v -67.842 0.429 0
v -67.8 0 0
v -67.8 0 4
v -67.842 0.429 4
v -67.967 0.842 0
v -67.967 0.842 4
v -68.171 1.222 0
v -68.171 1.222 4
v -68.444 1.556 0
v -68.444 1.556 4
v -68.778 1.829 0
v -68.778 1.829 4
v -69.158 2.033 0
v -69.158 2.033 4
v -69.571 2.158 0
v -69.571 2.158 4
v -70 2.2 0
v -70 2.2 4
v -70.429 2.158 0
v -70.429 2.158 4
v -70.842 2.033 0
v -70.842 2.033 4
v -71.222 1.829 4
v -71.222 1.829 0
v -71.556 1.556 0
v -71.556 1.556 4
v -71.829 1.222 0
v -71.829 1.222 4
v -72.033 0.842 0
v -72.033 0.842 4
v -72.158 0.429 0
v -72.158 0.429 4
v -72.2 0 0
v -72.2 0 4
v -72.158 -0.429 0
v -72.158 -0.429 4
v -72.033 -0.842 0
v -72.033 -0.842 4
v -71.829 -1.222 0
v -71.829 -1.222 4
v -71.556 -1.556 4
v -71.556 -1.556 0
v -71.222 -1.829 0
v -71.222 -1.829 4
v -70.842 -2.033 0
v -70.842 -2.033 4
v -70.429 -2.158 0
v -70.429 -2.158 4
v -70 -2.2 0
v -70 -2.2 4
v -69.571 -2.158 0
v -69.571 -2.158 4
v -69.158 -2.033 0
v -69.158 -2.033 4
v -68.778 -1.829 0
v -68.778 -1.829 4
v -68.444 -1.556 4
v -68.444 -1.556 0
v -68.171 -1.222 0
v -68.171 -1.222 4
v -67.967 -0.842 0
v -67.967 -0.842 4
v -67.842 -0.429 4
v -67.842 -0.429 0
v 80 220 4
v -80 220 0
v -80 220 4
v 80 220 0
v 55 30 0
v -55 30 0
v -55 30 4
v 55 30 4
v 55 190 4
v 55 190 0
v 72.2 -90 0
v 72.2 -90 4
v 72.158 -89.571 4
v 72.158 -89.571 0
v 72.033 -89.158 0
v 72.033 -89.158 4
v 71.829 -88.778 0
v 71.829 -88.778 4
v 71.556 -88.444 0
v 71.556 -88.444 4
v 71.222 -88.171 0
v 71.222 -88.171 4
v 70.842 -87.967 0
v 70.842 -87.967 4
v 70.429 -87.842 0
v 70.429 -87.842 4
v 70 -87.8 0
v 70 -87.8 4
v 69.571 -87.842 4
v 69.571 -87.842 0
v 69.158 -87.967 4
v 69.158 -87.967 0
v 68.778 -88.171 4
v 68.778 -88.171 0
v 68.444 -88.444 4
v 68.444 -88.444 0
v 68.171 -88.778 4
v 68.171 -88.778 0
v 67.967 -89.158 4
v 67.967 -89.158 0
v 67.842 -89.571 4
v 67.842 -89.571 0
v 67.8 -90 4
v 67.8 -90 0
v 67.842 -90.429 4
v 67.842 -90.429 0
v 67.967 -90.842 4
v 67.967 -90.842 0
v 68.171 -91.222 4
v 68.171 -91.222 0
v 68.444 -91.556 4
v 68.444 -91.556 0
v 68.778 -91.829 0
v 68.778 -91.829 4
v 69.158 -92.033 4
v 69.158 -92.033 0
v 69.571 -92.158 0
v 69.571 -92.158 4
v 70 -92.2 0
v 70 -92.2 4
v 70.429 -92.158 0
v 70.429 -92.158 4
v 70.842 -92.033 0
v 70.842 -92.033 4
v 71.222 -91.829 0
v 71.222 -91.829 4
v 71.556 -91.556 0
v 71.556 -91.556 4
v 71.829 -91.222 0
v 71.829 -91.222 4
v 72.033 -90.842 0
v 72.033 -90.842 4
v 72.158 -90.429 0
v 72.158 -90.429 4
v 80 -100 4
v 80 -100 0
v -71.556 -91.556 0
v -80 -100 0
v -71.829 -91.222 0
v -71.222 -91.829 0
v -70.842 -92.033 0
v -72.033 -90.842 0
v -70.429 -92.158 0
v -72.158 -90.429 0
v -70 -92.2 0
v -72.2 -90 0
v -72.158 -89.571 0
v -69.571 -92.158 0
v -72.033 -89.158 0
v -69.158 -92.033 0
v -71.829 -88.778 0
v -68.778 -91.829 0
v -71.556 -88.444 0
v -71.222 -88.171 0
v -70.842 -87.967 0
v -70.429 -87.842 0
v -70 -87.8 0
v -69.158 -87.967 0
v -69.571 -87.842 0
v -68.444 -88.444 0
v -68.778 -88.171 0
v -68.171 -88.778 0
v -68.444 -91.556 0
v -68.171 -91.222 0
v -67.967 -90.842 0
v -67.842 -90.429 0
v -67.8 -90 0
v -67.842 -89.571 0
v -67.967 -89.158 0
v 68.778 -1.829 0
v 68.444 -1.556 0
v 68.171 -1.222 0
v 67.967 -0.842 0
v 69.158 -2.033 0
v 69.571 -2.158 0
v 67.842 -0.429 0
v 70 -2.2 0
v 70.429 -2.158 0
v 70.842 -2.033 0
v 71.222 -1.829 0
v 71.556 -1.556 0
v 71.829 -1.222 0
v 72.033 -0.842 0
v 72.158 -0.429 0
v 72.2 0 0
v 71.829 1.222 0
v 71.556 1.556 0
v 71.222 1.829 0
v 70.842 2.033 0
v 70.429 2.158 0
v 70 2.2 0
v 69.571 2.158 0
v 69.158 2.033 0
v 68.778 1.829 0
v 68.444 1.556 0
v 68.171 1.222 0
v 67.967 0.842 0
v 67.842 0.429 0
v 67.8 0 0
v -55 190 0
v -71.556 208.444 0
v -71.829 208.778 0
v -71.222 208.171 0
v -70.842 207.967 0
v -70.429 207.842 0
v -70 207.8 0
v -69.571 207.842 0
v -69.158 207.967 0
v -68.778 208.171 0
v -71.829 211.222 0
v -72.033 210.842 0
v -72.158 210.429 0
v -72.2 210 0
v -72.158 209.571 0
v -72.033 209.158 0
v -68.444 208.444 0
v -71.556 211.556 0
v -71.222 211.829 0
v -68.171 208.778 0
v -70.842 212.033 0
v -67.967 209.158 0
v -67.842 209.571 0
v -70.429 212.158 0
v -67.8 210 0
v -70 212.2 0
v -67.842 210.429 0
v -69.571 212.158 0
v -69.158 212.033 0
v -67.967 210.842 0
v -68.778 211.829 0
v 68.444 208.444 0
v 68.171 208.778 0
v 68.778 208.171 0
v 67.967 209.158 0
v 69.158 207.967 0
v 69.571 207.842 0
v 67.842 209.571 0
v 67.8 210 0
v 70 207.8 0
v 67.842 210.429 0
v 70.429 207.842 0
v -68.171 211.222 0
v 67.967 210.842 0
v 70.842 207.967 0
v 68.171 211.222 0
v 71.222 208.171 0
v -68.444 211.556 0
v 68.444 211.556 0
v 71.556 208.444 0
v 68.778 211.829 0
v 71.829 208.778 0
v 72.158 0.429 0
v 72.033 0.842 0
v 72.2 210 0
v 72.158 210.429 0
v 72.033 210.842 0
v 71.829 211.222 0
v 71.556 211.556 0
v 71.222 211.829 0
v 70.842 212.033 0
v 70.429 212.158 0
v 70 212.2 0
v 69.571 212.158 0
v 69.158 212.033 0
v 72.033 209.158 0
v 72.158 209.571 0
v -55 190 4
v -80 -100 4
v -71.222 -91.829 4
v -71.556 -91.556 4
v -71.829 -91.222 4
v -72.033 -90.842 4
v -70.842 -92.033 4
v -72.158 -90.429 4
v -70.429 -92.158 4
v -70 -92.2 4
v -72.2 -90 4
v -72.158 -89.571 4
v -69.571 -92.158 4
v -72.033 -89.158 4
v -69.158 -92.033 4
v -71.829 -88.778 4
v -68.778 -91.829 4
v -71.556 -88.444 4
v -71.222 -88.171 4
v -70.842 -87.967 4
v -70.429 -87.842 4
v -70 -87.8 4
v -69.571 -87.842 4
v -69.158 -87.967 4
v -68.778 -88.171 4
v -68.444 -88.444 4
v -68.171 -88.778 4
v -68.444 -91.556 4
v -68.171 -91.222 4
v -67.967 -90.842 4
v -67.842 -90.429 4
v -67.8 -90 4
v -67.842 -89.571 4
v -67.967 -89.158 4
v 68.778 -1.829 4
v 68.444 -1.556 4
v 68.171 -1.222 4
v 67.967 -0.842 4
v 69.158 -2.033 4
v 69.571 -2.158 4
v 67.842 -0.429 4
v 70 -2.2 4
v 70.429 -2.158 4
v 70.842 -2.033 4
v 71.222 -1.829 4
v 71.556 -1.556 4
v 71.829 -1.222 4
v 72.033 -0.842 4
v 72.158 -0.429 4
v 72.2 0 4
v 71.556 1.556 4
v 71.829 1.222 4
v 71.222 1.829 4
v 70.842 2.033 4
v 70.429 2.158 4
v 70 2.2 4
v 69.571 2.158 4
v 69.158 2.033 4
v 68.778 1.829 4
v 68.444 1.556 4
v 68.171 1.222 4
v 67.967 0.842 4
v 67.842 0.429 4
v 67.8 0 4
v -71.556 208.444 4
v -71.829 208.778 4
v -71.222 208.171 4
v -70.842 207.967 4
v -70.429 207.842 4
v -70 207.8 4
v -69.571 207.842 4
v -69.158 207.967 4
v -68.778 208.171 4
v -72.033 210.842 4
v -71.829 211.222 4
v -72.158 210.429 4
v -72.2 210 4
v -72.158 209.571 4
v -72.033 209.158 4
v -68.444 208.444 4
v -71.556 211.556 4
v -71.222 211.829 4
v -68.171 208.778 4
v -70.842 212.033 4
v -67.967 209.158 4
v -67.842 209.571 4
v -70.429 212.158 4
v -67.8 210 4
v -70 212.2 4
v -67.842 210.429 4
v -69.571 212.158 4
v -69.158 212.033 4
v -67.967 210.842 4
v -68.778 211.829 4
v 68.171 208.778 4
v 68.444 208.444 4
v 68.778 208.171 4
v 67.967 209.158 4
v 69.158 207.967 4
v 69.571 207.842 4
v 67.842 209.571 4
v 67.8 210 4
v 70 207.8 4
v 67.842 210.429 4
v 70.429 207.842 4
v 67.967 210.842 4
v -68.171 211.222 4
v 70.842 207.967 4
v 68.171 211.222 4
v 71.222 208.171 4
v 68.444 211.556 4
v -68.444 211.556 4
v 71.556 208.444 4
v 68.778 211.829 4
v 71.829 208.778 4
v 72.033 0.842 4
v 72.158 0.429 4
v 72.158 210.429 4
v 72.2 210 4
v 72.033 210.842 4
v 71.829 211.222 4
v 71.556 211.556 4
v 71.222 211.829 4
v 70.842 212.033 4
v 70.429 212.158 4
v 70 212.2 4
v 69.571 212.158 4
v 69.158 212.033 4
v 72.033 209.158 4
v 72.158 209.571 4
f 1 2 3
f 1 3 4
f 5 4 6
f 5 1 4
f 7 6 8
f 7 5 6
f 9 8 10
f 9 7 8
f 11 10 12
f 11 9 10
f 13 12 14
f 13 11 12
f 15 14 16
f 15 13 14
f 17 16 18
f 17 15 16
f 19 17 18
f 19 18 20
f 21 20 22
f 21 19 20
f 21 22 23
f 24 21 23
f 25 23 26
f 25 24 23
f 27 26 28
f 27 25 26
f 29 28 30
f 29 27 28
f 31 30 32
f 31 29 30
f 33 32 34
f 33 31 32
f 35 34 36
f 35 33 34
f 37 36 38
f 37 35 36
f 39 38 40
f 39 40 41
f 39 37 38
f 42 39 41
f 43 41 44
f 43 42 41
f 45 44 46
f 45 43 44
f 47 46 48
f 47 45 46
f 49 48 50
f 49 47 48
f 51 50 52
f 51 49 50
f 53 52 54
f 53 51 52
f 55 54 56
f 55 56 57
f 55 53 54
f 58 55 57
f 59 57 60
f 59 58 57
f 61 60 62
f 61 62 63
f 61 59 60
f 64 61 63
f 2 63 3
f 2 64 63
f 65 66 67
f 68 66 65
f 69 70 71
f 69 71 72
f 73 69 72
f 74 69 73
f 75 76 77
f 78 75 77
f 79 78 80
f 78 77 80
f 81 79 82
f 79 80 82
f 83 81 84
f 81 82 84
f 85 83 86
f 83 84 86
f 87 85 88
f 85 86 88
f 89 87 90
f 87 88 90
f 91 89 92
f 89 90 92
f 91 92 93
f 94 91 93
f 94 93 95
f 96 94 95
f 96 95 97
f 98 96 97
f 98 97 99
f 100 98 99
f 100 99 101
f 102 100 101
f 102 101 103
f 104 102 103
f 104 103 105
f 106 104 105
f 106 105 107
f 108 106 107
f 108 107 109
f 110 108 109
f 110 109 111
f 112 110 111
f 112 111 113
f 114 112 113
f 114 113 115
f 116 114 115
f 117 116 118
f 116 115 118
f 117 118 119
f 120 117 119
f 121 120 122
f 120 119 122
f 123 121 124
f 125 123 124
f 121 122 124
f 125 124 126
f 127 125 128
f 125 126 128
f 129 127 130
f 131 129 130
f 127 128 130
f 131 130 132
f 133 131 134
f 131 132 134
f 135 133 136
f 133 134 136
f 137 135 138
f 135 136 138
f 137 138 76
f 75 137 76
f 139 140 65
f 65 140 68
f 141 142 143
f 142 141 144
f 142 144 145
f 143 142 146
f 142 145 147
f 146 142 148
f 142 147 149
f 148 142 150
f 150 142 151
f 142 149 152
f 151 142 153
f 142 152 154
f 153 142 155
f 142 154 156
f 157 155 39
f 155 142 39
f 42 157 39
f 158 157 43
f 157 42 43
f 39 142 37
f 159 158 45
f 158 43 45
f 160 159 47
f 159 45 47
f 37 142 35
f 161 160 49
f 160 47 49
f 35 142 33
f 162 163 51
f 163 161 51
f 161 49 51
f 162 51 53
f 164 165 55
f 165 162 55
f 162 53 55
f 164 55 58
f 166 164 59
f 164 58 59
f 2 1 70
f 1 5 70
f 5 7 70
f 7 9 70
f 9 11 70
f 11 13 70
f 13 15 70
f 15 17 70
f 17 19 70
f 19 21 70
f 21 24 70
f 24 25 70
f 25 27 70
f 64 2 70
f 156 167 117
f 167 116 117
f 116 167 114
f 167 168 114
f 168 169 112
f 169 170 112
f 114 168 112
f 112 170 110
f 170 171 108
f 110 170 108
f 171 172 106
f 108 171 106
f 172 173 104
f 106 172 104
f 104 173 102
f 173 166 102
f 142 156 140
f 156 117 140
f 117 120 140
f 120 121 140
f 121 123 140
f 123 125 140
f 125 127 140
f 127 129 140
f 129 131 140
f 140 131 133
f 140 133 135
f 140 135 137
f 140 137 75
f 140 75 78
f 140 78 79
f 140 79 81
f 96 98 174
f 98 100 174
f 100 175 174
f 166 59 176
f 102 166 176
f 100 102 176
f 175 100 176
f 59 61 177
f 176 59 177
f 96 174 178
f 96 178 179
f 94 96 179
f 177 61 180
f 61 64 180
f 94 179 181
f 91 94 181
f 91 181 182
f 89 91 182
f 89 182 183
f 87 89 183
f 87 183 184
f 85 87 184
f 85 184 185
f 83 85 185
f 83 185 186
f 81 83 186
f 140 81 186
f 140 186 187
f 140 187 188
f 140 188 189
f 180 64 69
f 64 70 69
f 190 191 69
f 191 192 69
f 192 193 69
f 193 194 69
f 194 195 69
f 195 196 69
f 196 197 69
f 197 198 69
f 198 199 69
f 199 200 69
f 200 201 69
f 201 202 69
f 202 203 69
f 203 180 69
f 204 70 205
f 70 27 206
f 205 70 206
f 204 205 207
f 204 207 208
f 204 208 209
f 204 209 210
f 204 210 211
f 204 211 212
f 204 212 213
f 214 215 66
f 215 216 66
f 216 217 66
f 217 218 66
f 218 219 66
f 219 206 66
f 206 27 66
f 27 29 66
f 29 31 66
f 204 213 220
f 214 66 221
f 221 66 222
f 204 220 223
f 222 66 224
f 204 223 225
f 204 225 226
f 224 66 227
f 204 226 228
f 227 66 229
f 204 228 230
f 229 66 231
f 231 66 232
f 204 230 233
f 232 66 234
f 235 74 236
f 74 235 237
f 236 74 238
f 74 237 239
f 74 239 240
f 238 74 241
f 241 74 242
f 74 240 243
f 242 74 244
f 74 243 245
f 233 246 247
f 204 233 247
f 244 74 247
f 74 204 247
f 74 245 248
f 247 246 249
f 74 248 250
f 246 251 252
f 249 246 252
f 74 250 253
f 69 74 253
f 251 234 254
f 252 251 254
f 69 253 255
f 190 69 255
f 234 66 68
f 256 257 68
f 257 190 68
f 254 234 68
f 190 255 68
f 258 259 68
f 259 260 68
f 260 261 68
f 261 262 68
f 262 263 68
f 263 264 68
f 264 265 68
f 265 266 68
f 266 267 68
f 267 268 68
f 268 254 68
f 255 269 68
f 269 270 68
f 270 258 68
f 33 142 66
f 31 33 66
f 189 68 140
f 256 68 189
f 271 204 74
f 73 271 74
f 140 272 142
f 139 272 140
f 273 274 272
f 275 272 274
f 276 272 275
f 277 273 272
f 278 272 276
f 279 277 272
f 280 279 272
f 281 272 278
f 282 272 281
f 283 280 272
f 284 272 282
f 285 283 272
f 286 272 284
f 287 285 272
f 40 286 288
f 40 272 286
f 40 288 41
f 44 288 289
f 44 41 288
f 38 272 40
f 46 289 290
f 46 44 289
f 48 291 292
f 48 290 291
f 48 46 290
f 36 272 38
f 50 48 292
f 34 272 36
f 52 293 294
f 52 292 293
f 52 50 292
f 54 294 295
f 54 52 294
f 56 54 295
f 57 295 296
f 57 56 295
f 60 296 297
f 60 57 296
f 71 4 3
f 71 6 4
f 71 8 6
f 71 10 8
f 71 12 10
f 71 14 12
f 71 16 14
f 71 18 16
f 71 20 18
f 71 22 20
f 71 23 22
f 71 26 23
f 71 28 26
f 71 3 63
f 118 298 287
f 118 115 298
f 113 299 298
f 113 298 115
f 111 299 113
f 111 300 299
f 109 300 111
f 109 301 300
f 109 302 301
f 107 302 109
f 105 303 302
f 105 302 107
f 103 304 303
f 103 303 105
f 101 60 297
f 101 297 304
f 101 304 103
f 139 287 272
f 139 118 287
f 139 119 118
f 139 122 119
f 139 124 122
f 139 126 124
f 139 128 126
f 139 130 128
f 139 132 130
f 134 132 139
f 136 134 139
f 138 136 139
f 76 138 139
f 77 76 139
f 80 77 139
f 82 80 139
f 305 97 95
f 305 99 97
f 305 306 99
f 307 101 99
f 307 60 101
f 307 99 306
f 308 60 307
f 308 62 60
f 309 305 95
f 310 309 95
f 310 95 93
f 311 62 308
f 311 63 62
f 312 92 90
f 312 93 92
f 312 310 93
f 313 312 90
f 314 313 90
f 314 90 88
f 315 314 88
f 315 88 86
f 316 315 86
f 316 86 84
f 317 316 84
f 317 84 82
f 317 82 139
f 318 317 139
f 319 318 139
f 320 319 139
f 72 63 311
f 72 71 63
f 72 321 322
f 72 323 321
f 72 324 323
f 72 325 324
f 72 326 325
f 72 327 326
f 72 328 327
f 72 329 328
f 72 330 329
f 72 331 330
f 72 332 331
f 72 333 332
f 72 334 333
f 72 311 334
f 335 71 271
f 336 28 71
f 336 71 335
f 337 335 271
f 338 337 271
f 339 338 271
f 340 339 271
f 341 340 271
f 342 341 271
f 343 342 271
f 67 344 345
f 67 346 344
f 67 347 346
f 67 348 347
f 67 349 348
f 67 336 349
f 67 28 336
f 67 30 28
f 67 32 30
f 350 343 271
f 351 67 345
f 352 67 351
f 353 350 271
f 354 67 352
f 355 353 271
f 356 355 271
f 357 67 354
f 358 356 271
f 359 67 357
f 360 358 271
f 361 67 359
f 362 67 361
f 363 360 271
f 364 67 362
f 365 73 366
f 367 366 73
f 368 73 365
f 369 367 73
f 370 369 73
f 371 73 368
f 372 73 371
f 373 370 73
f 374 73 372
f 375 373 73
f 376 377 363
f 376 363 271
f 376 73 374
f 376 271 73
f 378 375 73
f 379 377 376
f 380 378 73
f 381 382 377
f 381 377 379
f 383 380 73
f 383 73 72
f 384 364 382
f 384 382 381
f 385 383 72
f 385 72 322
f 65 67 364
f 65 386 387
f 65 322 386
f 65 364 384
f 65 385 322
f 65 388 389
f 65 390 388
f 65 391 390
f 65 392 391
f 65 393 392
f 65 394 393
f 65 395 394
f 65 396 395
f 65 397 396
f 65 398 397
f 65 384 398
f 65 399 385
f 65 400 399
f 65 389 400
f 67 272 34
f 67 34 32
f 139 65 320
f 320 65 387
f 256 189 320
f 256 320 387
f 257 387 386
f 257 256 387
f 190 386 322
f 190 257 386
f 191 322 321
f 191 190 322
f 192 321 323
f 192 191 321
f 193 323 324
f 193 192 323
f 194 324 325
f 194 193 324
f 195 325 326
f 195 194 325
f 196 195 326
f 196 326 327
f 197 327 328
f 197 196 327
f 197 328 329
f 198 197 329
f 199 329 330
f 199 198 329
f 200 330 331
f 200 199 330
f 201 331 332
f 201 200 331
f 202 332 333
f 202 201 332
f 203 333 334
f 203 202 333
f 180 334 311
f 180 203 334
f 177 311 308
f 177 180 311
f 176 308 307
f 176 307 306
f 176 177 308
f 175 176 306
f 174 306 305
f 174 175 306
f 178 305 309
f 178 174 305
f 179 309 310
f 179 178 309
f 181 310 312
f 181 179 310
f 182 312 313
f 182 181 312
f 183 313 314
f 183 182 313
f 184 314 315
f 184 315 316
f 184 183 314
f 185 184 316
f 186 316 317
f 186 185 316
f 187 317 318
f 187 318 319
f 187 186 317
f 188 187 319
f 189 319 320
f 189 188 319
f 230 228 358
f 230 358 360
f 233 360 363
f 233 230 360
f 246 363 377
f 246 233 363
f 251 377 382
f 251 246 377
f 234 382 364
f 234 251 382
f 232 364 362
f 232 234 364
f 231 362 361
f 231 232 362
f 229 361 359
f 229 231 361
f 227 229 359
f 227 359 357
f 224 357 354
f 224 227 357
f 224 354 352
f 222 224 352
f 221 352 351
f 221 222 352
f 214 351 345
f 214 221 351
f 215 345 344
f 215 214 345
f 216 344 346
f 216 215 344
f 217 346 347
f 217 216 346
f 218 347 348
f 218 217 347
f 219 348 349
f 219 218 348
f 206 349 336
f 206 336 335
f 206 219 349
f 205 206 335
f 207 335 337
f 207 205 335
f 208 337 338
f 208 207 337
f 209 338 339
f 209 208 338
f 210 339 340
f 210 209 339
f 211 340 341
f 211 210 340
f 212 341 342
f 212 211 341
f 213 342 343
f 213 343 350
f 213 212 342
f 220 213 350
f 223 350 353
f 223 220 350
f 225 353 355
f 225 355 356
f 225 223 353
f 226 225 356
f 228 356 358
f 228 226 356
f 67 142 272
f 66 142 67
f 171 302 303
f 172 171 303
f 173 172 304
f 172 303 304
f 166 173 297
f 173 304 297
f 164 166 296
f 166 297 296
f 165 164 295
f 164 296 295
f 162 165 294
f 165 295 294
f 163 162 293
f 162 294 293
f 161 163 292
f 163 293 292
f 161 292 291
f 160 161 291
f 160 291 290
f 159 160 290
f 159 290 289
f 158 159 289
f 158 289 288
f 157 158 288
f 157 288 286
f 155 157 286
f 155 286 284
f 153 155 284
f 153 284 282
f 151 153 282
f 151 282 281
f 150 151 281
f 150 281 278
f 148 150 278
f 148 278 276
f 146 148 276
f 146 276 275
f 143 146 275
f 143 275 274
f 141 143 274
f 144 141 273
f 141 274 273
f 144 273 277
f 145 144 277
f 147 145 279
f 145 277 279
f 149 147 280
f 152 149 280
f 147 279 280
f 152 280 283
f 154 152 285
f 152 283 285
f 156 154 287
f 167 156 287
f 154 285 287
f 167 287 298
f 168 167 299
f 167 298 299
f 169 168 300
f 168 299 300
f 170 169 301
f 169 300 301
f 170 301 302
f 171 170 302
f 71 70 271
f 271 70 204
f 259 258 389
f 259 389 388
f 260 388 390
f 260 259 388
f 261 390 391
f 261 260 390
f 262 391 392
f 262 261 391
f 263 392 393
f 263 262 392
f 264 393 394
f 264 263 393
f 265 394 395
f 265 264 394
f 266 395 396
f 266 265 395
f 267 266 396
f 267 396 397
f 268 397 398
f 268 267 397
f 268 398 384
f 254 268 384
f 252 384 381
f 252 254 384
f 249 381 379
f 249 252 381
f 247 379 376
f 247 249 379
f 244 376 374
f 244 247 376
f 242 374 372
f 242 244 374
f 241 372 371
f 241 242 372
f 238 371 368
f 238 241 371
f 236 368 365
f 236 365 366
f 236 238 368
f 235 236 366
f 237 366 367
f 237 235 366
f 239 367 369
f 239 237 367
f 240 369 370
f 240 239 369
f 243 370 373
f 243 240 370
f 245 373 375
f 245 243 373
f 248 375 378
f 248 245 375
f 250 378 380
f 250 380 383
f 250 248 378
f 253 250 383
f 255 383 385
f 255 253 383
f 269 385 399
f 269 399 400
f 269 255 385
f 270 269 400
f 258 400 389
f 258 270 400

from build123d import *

# Parameters (mm, degrees)
ESQUISSE1_W             = 160
ESQUISSE1_H             = 440
ESQUISSE1_R             = 2.2
ESQUISSE1_W_2           = 110
ESQUISSE1_H_2           = 160
BOSS_EXTRU_1_DEPTH      = 4
ESQUISSE2_R             = 2.2
ESQUISSE2_W             = 160
ESQUISSE2_H             = 120
ENL_V_MAT_EXTRU_1_DEPTH = 5


with BuildPart() as part:
    # Esquisse1 → Boss.-Extru.1 (new body)
    with BuildSketch(Plane.XY):
        Rectangle(ESQUISSE1_W, ESQUISSE1_H)
        with Locations((70, 0)):
            Circle(ESQUISSE1_R, mode=Mode.SUBTRACT)
        with Locations((70, 210)):
            Circle(ESQUISSE1_R, mode=Mode.SUBTRACT)
        with Locations((70, -210)):
            Circle(ESQUISSE1_R, mode=Mode.SUBTRACT)
        with Locations((-70, 210)):
            Circle(ESQUISSE1_R, mode=Mode.SUBTRACT)
        with Locations((-70, 0)):
            Circle(ESQUISSE1_R, mode=Mode.SUBTRACT)
        with Locations((-70, -210)):
            Circle(ESQUISSE1_R, mode=Mode.SUBTRACT)
        with Locations((0, 110)):
            Rectangle(ESQUISSE1_W_2, ESQUISSE1_H_2, mode=Mode.SUBTRACT)
    extrude(amount=BOSS_EXTRU_1_DEPTH)

    # Esquisse2 → Enlèv. mat.-Extru.1 (cut, through all)
    with BuildSketch(Plane.XY.offset(4)):
        with Locations((-70, -90)):
            Circle(ESQUISSE2_R)
        with Locations((70, -90)):
            Circle(ESQUISSE2_R)
        with Locations((0, -160)):
            Rectangle(ESQUISSE2_W, ESQUISSE2_H)
    extrude(amount=-ENL_V_MAT_EXTRU_1_DEPTH, mode=Mode.SUBTRACT)


solid = part.part
